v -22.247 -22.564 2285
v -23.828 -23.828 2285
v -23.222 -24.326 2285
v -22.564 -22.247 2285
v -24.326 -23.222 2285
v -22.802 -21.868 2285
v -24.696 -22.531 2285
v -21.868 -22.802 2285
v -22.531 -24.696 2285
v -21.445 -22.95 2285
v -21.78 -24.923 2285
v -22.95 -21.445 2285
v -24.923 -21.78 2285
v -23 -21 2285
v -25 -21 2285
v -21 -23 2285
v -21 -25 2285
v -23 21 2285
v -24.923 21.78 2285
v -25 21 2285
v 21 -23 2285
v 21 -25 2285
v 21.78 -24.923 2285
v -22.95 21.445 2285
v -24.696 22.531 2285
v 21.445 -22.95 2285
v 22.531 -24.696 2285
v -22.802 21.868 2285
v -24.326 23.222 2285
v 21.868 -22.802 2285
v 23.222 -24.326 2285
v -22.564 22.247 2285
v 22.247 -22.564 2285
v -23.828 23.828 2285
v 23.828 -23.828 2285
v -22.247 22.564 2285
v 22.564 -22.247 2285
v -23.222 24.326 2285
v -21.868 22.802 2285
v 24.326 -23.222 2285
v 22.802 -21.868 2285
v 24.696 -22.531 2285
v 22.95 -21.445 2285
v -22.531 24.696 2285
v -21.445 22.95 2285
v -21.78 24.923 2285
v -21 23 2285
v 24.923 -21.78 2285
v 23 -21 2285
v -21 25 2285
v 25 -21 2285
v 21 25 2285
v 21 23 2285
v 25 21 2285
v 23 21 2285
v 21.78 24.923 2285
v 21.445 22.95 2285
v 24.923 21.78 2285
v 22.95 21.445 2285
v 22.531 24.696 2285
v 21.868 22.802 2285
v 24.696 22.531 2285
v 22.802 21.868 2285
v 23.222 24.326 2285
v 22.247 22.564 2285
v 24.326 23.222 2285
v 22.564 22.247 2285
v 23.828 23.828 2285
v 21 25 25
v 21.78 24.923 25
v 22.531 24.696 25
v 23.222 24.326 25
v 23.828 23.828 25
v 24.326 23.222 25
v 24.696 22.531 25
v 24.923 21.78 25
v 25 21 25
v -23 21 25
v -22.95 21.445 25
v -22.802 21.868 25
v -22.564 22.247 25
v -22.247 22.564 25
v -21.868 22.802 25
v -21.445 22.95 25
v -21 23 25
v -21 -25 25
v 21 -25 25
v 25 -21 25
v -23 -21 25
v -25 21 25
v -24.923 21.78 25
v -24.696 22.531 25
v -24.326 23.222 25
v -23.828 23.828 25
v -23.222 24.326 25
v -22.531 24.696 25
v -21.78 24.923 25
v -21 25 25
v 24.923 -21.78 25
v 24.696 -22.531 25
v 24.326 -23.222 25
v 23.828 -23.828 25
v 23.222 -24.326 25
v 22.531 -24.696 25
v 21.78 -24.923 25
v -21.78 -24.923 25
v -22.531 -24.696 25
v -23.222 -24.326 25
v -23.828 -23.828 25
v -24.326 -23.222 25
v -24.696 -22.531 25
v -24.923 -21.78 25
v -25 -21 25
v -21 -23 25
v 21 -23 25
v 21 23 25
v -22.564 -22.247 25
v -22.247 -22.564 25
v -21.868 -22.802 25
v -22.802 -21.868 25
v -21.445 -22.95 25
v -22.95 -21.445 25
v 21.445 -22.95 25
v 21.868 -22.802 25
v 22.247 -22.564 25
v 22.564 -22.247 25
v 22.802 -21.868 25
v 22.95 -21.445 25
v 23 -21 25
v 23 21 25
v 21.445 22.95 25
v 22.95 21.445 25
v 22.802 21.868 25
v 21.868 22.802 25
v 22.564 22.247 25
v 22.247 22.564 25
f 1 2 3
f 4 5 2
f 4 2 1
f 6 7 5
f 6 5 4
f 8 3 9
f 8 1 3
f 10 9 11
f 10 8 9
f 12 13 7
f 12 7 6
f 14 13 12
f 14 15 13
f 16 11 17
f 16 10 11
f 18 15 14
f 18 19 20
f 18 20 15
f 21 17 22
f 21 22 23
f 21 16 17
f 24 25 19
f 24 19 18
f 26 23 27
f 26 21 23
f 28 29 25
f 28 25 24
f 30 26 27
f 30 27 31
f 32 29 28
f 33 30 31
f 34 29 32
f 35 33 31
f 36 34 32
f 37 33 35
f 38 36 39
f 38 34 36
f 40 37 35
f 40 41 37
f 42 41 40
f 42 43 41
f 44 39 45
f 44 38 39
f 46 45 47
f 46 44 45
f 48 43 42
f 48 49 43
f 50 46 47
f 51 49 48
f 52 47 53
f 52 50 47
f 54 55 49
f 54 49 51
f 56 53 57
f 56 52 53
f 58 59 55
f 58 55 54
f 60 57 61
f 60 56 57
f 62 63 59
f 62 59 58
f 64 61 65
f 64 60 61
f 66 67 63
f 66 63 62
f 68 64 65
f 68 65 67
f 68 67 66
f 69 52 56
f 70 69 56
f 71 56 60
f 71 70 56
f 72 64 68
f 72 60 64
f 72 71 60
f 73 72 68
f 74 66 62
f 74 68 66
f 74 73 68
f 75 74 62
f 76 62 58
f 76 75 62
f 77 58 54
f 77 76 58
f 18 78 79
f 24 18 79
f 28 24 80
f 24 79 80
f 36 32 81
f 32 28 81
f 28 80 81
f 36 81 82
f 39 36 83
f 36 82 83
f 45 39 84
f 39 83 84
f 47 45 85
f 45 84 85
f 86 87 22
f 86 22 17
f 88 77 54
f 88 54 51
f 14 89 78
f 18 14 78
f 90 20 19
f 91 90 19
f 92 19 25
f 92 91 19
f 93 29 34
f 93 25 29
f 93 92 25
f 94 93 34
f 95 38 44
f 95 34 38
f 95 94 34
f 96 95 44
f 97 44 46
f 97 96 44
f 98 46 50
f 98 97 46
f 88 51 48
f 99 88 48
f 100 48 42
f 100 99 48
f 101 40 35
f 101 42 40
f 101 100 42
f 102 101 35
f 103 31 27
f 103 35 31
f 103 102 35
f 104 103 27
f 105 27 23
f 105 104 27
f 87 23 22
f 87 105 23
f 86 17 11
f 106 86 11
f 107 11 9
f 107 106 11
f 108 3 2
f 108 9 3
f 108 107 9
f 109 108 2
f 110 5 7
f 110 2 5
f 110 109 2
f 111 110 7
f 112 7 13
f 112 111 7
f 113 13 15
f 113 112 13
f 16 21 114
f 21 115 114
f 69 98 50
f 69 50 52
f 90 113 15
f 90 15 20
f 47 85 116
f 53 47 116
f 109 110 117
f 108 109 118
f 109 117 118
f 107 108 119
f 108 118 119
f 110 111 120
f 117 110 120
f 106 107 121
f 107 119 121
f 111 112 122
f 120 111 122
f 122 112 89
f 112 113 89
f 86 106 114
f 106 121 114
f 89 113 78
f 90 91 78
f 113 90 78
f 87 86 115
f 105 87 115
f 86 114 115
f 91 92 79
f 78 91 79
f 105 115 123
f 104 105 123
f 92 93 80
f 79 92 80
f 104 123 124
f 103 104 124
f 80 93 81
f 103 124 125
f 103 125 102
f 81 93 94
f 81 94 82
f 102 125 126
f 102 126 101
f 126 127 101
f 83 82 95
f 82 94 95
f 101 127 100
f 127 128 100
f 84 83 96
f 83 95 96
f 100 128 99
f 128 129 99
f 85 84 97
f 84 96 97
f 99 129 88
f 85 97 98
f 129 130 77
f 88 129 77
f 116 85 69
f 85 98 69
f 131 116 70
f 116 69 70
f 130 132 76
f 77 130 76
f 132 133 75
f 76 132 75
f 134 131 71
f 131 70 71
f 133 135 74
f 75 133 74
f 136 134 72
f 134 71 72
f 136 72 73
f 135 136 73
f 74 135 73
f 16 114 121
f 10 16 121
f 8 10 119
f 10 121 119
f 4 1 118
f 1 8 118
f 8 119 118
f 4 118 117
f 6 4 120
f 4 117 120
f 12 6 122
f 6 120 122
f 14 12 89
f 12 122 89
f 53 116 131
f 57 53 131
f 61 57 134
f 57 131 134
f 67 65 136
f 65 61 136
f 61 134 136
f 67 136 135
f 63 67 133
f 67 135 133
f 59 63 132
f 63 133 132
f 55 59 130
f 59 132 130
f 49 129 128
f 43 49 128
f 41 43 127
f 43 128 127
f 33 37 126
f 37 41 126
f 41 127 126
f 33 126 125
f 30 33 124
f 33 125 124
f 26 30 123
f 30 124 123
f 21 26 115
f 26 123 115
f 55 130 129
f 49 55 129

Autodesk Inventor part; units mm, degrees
ref_plane "Start Plane" through (0, 0, 25) normal (0, 0, 1) x (1, 0, 0)
ref_plane "End Plane" through (0, 0, 2285) normal (0, 0, 1) x (1, 0, 0)
sketch "Sketch" plane through (0, 0, 0) normal (0, 0, 1) x (1, 0, 0)
  line L0 (-25, -21) -> (-25, 21)
  line L1 (-21, 25) -> (21, 25)
  line L2 (25, 21) -> (25, -21)
  line L3 (21, -25) -> (-21, -25)
  arc A0 (-25, -21) -> (-21, -25) centre (-21, -21) ccw
  arc A1 (25, 21) -> (21, 25) centre (21, 21) ccw
  arc A2 (-21, 25) -> (-25, 21) centre (-21, 21) ccw
  arc A3 (21, -25) -> (25, -21) centre (21, -21) ccw
  arc A4 (-21, 23) -> (-23, 21) centre (-21, 21) ccw
  line L4 (-21, 23) -> (21, 23)
  arc A5 (23, 21) -> (21, 23) centre (21, 21) ccw
  line L5 (23, 21) -> (23, -21)
  arc A6 (21, -23) -> (23, -21) centre (21, -21) ccw
  line L6 (21, -23) -> (-21, -23)
  arc A7 (-23, -21) -> (-21, -23) centre (-21, -21) ccw
  line L7 (-23, -21) -> (-23, 21)
  line L8 (0, 36.1598) -> (0, -36.1598) construction
  line L9 (-36.1598, 0) -> (36.1598, 0) construction
  dimension "d7" = 4
  dimension "d9" = 50
  dimension "d11" = 50
  dimension "d12" = 2
  dimension "d15" = 25
  dimension "d16" = 25
extrude "Body" add sketch "Sketch" along normal up to surface (2260 mm away) from surface at 25
sketch "Sketch3" plane through (0, 0, 0) normal (0, 0, 1) x (1, 0, 0)
  line L0 (0, 0) -> (10, 0)
ref_plane "Work Plane3" through (0, 0, 0) normal (0, -1, 0) x (1, 0, 0)
sketch "Sketch4" plane through (0, 0, 0) normal (0, -1, 0) x (1, 0, 0)
  line L0 (-2, 25) -> (12, 25)
  line L1 (-2, 2285) -> (12, 2285)
  dimension "d18" = 2260
ref_plane "Work Plane4" through (-235, -21, 25) normal (0, 0, -1) x (-1, 0, 0)
split "Split1" plane through (-235, -21, 25) removes the side toward (0, 0, -1)
ref_plane "Work Plane5" through (-235, 21, 2285) normal (0, 0, 1) x (1, 0, 0)
split "Split2" plane through (-235, 21, 2285) removes the side toward (0, 0, 1)
equation "\"d7\" = G_IR"
equation "\"d9\" = G_W"
equation "\"d11\" = G_H"
equation "\"d12\" = G_T"
equation "\"d15\" = 0.5 * d9"
equation "\"d16\" = 0.5 * d11"
equation "\"d3\" = G_L"
equation "\"G_W\" = 50"
equation "\"G_H\" = 50"
equation "\"G_T\" = 2"
equation "\"G_IR\" = 4"
equation "\"G_L\" = d18"
equation "\"G_OFFSET_START\" = -25"
equation "\"G_OFFSET_END\" = -25"
equation "\"d13\" = -G_OFFSET_START"
equation "\"d14\" = G_OFFSET_END + B_L"
equation "\"B_L\" = 2310"
properties part number "ISO 10799-2 - 50x50x2 - 2260"
